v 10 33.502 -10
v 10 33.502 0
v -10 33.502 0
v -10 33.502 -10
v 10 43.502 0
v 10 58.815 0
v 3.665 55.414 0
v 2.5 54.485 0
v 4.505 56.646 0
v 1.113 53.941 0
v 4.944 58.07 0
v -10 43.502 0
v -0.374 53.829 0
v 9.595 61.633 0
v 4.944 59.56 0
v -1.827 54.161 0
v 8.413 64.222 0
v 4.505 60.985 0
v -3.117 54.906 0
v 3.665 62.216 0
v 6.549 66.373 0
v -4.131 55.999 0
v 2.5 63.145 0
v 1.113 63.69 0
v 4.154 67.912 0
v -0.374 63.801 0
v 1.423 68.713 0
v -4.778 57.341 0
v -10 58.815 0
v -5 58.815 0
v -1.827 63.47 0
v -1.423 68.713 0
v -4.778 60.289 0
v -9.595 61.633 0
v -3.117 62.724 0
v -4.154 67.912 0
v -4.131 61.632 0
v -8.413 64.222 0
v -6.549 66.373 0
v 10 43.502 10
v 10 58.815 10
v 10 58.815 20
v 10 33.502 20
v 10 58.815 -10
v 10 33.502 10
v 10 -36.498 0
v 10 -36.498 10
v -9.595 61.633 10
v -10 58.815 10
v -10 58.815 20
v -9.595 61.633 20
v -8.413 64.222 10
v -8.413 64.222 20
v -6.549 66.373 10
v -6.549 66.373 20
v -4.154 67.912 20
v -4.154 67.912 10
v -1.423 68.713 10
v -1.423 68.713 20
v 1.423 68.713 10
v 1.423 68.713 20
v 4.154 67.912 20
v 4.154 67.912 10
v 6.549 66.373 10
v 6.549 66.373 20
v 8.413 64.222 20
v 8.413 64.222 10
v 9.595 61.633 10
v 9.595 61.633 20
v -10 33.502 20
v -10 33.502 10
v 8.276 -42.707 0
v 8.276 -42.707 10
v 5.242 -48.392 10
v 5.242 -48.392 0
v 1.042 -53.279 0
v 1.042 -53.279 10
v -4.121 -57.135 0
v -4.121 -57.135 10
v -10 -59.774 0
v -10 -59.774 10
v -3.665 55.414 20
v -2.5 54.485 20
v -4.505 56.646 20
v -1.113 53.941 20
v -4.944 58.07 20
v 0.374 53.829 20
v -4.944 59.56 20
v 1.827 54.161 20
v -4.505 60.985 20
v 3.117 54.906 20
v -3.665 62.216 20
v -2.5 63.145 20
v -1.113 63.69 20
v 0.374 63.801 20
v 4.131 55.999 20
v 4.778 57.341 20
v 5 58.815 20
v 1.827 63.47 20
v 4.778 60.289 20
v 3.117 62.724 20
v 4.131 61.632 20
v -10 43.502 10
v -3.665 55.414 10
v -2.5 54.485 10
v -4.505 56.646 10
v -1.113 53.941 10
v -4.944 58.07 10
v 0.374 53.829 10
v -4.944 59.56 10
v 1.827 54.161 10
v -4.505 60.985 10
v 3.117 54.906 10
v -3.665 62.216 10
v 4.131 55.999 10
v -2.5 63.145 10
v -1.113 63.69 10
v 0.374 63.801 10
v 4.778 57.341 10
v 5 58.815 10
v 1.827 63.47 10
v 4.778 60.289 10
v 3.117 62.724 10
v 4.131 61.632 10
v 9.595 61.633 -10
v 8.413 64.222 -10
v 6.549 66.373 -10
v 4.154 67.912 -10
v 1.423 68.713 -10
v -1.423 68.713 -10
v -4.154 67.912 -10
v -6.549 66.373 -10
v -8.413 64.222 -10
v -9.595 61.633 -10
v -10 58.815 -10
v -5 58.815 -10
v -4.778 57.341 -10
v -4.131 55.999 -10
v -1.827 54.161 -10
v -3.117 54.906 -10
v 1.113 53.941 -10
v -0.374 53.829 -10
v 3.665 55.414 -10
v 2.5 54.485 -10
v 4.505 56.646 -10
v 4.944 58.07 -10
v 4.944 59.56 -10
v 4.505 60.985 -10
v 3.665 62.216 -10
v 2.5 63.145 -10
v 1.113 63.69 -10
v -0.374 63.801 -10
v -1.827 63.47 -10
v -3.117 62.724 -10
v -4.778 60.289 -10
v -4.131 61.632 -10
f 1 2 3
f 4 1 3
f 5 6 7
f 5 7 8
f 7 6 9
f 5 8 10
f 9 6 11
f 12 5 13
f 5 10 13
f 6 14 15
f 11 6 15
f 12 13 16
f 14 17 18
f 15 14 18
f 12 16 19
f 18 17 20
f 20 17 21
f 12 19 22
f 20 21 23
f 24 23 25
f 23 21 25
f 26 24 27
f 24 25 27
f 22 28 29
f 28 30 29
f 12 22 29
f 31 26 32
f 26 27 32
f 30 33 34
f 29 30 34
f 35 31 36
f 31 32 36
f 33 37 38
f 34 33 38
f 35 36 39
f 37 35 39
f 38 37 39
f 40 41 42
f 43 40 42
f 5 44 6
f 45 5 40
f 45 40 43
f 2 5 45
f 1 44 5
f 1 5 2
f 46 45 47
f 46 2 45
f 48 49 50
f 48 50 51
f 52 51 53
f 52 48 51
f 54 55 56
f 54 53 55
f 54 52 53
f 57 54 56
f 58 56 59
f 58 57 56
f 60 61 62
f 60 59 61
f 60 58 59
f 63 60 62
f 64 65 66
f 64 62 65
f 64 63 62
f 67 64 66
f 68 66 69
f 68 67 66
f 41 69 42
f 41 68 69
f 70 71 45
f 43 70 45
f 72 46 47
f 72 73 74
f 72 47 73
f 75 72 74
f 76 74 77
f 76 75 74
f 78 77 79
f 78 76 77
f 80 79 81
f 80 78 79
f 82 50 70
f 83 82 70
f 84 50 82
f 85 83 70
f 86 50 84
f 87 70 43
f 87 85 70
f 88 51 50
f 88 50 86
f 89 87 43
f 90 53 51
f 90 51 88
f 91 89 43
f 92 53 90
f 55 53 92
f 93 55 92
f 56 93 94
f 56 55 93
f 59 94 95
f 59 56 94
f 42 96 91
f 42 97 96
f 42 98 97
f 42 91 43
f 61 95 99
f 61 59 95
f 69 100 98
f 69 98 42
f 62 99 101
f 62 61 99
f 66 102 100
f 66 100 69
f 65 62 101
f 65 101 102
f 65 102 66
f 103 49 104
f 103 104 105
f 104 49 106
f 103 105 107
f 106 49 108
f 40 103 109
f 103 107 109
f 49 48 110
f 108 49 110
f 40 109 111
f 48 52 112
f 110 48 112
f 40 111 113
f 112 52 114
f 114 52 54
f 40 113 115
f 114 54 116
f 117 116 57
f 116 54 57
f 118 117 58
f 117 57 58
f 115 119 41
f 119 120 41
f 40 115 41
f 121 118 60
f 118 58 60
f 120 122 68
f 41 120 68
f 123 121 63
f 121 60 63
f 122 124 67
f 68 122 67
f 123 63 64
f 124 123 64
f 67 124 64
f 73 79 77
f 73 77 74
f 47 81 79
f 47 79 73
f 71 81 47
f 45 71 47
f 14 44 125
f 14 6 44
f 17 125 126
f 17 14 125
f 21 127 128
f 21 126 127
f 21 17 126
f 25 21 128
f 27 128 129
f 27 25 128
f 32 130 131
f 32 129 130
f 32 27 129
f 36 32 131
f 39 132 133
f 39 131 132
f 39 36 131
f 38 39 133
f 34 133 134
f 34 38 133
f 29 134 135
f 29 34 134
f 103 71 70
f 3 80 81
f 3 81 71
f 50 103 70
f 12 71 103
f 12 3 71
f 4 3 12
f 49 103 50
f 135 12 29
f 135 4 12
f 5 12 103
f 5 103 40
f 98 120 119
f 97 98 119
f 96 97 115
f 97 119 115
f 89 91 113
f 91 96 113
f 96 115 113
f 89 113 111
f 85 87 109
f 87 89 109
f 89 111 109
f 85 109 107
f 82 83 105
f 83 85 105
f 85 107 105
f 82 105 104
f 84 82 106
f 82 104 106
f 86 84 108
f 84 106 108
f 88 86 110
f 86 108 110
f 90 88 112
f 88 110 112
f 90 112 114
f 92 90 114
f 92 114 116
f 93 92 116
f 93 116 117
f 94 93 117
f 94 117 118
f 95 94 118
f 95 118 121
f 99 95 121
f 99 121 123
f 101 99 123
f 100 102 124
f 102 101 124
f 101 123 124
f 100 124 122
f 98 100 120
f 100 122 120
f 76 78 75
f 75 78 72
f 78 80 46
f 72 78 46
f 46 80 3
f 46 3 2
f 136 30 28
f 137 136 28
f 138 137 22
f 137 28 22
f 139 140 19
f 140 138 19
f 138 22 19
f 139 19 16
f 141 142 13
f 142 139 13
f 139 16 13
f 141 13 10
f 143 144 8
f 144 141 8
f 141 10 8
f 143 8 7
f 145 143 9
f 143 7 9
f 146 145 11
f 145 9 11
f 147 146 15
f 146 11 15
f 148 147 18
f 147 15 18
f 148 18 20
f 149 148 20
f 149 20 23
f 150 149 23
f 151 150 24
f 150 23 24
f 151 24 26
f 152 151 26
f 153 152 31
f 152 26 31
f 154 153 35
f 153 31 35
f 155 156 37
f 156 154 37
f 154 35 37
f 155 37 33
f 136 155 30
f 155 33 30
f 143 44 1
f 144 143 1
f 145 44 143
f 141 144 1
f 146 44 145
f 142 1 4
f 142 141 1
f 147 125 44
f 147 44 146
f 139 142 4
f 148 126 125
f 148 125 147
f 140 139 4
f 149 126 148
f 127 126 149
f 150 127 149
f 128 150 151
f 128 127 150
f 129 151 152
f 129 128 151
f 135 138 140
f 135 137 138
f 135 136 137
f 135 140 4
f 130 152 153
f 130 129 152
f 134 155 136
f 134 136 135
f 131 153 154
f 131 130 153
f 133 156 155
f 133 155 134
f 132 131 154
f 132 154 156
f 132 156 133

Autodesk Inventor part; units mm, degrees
ref_plane "YZ Plane" through (0, 0, 0) normal (1, 0, 0) x (0, 1, 0)
ref_plane "XZ Plane" through (0, 0, 0) normal (0, 1, 0) x (-1, 0, 0)
ref_plane "XY Plane" through (0, 0, 0) normal (0, 0, 1) x (1, 0, 0)
sketch "Sketch1" plane through (0, 0, 0) normal (0, 0, 1) x (1, 0, 0)
  line L0 (-10, 43.5021) -> (10, 43.5021)
  line L1 (10, 43.5021) -> (10, -36.4979)
  line L2 (10, -36.4979) -> (-10, -36.4979)
  line L3 (-10, -36.4979) -> (-10, 43.5021)
  arc A0 (-10, -59.7738) -> (10, -36.4979) centre (-19.0329, -31.7817) ccw
  line L4 (-10, -59.7738) -> (-10, -36.4979)
  point P0 (0, 0)
  dimension "d0" = 20
  dimension "d1" = 10
  dimension "d2" = 80
extrude "Extrusion1" add sketch "Sketch1" along normal blind 10
sketch "Sketch2" plane through (0, 0, 10) normal (0, 0, 1) x (1, 0, 0)
  line L0 (-10, 43.5021) -> (-10, -59.7738) projected
  line L1 (-10, 33.5021) -> (10, 33.5021)
  line L2 (10, 33.5021) -> (10, 58.8152)
  line L3 (-10, 58.8152) -> (-10, 33.5021)
  line L4 (10, 43.5021) -> (-10, 43.5021) projected
  arc A0 (10, 58.8152) -> (-10, 58.8152) centre (0, 58.8152) ccw
  circle A1 centre (0, 58.8152) radius 5
  point P0 (0, 0)
  dimension "d5" = 20
  dimension "d6" = 10
  dimension "d7" = 10
extrude "Extrusion2" add sketch "Sketch2" along normal blind 10
sketch "Sketch3" plane through (0, 0, 0) normal (0, 0, -1) x (-1, 0, 0)
  point P0 (0, 0)
sketch "Sketch4" plane through (0, 0, 0) normal (0, 0, -1) x (-1, 0, 0)
  line L0 (-10, -36.4979) -> (-10, 43.5021) projected
  arc A0 (10, 58.8152) -> (-10, 58.8152) centre (0, 58.8152) ccw projected
  line L1 (-10, 33.5021) -> (10, 33.5021)
  line L2 (10, 33.5021) -> (10, 58.8152)
  line L3 (-10, 58.8152) -> (-10, 33.5021)
  line L4 (-10, 43.5021) -> (10, 43.5021) projected
  arc A1 (10, 58.8152) -> (-10, 58.8152) centre (0, 58.8152) ccw
  circle A2 centre (0, 58.8152) radius 5
  point P0 (0, 0)
  point P1 (-10, 58.8152)
  dimension "d10" = 10
extrude "Extrusion3" add sketch "Sketch4" along normal blind 10
properties part number "foot"
